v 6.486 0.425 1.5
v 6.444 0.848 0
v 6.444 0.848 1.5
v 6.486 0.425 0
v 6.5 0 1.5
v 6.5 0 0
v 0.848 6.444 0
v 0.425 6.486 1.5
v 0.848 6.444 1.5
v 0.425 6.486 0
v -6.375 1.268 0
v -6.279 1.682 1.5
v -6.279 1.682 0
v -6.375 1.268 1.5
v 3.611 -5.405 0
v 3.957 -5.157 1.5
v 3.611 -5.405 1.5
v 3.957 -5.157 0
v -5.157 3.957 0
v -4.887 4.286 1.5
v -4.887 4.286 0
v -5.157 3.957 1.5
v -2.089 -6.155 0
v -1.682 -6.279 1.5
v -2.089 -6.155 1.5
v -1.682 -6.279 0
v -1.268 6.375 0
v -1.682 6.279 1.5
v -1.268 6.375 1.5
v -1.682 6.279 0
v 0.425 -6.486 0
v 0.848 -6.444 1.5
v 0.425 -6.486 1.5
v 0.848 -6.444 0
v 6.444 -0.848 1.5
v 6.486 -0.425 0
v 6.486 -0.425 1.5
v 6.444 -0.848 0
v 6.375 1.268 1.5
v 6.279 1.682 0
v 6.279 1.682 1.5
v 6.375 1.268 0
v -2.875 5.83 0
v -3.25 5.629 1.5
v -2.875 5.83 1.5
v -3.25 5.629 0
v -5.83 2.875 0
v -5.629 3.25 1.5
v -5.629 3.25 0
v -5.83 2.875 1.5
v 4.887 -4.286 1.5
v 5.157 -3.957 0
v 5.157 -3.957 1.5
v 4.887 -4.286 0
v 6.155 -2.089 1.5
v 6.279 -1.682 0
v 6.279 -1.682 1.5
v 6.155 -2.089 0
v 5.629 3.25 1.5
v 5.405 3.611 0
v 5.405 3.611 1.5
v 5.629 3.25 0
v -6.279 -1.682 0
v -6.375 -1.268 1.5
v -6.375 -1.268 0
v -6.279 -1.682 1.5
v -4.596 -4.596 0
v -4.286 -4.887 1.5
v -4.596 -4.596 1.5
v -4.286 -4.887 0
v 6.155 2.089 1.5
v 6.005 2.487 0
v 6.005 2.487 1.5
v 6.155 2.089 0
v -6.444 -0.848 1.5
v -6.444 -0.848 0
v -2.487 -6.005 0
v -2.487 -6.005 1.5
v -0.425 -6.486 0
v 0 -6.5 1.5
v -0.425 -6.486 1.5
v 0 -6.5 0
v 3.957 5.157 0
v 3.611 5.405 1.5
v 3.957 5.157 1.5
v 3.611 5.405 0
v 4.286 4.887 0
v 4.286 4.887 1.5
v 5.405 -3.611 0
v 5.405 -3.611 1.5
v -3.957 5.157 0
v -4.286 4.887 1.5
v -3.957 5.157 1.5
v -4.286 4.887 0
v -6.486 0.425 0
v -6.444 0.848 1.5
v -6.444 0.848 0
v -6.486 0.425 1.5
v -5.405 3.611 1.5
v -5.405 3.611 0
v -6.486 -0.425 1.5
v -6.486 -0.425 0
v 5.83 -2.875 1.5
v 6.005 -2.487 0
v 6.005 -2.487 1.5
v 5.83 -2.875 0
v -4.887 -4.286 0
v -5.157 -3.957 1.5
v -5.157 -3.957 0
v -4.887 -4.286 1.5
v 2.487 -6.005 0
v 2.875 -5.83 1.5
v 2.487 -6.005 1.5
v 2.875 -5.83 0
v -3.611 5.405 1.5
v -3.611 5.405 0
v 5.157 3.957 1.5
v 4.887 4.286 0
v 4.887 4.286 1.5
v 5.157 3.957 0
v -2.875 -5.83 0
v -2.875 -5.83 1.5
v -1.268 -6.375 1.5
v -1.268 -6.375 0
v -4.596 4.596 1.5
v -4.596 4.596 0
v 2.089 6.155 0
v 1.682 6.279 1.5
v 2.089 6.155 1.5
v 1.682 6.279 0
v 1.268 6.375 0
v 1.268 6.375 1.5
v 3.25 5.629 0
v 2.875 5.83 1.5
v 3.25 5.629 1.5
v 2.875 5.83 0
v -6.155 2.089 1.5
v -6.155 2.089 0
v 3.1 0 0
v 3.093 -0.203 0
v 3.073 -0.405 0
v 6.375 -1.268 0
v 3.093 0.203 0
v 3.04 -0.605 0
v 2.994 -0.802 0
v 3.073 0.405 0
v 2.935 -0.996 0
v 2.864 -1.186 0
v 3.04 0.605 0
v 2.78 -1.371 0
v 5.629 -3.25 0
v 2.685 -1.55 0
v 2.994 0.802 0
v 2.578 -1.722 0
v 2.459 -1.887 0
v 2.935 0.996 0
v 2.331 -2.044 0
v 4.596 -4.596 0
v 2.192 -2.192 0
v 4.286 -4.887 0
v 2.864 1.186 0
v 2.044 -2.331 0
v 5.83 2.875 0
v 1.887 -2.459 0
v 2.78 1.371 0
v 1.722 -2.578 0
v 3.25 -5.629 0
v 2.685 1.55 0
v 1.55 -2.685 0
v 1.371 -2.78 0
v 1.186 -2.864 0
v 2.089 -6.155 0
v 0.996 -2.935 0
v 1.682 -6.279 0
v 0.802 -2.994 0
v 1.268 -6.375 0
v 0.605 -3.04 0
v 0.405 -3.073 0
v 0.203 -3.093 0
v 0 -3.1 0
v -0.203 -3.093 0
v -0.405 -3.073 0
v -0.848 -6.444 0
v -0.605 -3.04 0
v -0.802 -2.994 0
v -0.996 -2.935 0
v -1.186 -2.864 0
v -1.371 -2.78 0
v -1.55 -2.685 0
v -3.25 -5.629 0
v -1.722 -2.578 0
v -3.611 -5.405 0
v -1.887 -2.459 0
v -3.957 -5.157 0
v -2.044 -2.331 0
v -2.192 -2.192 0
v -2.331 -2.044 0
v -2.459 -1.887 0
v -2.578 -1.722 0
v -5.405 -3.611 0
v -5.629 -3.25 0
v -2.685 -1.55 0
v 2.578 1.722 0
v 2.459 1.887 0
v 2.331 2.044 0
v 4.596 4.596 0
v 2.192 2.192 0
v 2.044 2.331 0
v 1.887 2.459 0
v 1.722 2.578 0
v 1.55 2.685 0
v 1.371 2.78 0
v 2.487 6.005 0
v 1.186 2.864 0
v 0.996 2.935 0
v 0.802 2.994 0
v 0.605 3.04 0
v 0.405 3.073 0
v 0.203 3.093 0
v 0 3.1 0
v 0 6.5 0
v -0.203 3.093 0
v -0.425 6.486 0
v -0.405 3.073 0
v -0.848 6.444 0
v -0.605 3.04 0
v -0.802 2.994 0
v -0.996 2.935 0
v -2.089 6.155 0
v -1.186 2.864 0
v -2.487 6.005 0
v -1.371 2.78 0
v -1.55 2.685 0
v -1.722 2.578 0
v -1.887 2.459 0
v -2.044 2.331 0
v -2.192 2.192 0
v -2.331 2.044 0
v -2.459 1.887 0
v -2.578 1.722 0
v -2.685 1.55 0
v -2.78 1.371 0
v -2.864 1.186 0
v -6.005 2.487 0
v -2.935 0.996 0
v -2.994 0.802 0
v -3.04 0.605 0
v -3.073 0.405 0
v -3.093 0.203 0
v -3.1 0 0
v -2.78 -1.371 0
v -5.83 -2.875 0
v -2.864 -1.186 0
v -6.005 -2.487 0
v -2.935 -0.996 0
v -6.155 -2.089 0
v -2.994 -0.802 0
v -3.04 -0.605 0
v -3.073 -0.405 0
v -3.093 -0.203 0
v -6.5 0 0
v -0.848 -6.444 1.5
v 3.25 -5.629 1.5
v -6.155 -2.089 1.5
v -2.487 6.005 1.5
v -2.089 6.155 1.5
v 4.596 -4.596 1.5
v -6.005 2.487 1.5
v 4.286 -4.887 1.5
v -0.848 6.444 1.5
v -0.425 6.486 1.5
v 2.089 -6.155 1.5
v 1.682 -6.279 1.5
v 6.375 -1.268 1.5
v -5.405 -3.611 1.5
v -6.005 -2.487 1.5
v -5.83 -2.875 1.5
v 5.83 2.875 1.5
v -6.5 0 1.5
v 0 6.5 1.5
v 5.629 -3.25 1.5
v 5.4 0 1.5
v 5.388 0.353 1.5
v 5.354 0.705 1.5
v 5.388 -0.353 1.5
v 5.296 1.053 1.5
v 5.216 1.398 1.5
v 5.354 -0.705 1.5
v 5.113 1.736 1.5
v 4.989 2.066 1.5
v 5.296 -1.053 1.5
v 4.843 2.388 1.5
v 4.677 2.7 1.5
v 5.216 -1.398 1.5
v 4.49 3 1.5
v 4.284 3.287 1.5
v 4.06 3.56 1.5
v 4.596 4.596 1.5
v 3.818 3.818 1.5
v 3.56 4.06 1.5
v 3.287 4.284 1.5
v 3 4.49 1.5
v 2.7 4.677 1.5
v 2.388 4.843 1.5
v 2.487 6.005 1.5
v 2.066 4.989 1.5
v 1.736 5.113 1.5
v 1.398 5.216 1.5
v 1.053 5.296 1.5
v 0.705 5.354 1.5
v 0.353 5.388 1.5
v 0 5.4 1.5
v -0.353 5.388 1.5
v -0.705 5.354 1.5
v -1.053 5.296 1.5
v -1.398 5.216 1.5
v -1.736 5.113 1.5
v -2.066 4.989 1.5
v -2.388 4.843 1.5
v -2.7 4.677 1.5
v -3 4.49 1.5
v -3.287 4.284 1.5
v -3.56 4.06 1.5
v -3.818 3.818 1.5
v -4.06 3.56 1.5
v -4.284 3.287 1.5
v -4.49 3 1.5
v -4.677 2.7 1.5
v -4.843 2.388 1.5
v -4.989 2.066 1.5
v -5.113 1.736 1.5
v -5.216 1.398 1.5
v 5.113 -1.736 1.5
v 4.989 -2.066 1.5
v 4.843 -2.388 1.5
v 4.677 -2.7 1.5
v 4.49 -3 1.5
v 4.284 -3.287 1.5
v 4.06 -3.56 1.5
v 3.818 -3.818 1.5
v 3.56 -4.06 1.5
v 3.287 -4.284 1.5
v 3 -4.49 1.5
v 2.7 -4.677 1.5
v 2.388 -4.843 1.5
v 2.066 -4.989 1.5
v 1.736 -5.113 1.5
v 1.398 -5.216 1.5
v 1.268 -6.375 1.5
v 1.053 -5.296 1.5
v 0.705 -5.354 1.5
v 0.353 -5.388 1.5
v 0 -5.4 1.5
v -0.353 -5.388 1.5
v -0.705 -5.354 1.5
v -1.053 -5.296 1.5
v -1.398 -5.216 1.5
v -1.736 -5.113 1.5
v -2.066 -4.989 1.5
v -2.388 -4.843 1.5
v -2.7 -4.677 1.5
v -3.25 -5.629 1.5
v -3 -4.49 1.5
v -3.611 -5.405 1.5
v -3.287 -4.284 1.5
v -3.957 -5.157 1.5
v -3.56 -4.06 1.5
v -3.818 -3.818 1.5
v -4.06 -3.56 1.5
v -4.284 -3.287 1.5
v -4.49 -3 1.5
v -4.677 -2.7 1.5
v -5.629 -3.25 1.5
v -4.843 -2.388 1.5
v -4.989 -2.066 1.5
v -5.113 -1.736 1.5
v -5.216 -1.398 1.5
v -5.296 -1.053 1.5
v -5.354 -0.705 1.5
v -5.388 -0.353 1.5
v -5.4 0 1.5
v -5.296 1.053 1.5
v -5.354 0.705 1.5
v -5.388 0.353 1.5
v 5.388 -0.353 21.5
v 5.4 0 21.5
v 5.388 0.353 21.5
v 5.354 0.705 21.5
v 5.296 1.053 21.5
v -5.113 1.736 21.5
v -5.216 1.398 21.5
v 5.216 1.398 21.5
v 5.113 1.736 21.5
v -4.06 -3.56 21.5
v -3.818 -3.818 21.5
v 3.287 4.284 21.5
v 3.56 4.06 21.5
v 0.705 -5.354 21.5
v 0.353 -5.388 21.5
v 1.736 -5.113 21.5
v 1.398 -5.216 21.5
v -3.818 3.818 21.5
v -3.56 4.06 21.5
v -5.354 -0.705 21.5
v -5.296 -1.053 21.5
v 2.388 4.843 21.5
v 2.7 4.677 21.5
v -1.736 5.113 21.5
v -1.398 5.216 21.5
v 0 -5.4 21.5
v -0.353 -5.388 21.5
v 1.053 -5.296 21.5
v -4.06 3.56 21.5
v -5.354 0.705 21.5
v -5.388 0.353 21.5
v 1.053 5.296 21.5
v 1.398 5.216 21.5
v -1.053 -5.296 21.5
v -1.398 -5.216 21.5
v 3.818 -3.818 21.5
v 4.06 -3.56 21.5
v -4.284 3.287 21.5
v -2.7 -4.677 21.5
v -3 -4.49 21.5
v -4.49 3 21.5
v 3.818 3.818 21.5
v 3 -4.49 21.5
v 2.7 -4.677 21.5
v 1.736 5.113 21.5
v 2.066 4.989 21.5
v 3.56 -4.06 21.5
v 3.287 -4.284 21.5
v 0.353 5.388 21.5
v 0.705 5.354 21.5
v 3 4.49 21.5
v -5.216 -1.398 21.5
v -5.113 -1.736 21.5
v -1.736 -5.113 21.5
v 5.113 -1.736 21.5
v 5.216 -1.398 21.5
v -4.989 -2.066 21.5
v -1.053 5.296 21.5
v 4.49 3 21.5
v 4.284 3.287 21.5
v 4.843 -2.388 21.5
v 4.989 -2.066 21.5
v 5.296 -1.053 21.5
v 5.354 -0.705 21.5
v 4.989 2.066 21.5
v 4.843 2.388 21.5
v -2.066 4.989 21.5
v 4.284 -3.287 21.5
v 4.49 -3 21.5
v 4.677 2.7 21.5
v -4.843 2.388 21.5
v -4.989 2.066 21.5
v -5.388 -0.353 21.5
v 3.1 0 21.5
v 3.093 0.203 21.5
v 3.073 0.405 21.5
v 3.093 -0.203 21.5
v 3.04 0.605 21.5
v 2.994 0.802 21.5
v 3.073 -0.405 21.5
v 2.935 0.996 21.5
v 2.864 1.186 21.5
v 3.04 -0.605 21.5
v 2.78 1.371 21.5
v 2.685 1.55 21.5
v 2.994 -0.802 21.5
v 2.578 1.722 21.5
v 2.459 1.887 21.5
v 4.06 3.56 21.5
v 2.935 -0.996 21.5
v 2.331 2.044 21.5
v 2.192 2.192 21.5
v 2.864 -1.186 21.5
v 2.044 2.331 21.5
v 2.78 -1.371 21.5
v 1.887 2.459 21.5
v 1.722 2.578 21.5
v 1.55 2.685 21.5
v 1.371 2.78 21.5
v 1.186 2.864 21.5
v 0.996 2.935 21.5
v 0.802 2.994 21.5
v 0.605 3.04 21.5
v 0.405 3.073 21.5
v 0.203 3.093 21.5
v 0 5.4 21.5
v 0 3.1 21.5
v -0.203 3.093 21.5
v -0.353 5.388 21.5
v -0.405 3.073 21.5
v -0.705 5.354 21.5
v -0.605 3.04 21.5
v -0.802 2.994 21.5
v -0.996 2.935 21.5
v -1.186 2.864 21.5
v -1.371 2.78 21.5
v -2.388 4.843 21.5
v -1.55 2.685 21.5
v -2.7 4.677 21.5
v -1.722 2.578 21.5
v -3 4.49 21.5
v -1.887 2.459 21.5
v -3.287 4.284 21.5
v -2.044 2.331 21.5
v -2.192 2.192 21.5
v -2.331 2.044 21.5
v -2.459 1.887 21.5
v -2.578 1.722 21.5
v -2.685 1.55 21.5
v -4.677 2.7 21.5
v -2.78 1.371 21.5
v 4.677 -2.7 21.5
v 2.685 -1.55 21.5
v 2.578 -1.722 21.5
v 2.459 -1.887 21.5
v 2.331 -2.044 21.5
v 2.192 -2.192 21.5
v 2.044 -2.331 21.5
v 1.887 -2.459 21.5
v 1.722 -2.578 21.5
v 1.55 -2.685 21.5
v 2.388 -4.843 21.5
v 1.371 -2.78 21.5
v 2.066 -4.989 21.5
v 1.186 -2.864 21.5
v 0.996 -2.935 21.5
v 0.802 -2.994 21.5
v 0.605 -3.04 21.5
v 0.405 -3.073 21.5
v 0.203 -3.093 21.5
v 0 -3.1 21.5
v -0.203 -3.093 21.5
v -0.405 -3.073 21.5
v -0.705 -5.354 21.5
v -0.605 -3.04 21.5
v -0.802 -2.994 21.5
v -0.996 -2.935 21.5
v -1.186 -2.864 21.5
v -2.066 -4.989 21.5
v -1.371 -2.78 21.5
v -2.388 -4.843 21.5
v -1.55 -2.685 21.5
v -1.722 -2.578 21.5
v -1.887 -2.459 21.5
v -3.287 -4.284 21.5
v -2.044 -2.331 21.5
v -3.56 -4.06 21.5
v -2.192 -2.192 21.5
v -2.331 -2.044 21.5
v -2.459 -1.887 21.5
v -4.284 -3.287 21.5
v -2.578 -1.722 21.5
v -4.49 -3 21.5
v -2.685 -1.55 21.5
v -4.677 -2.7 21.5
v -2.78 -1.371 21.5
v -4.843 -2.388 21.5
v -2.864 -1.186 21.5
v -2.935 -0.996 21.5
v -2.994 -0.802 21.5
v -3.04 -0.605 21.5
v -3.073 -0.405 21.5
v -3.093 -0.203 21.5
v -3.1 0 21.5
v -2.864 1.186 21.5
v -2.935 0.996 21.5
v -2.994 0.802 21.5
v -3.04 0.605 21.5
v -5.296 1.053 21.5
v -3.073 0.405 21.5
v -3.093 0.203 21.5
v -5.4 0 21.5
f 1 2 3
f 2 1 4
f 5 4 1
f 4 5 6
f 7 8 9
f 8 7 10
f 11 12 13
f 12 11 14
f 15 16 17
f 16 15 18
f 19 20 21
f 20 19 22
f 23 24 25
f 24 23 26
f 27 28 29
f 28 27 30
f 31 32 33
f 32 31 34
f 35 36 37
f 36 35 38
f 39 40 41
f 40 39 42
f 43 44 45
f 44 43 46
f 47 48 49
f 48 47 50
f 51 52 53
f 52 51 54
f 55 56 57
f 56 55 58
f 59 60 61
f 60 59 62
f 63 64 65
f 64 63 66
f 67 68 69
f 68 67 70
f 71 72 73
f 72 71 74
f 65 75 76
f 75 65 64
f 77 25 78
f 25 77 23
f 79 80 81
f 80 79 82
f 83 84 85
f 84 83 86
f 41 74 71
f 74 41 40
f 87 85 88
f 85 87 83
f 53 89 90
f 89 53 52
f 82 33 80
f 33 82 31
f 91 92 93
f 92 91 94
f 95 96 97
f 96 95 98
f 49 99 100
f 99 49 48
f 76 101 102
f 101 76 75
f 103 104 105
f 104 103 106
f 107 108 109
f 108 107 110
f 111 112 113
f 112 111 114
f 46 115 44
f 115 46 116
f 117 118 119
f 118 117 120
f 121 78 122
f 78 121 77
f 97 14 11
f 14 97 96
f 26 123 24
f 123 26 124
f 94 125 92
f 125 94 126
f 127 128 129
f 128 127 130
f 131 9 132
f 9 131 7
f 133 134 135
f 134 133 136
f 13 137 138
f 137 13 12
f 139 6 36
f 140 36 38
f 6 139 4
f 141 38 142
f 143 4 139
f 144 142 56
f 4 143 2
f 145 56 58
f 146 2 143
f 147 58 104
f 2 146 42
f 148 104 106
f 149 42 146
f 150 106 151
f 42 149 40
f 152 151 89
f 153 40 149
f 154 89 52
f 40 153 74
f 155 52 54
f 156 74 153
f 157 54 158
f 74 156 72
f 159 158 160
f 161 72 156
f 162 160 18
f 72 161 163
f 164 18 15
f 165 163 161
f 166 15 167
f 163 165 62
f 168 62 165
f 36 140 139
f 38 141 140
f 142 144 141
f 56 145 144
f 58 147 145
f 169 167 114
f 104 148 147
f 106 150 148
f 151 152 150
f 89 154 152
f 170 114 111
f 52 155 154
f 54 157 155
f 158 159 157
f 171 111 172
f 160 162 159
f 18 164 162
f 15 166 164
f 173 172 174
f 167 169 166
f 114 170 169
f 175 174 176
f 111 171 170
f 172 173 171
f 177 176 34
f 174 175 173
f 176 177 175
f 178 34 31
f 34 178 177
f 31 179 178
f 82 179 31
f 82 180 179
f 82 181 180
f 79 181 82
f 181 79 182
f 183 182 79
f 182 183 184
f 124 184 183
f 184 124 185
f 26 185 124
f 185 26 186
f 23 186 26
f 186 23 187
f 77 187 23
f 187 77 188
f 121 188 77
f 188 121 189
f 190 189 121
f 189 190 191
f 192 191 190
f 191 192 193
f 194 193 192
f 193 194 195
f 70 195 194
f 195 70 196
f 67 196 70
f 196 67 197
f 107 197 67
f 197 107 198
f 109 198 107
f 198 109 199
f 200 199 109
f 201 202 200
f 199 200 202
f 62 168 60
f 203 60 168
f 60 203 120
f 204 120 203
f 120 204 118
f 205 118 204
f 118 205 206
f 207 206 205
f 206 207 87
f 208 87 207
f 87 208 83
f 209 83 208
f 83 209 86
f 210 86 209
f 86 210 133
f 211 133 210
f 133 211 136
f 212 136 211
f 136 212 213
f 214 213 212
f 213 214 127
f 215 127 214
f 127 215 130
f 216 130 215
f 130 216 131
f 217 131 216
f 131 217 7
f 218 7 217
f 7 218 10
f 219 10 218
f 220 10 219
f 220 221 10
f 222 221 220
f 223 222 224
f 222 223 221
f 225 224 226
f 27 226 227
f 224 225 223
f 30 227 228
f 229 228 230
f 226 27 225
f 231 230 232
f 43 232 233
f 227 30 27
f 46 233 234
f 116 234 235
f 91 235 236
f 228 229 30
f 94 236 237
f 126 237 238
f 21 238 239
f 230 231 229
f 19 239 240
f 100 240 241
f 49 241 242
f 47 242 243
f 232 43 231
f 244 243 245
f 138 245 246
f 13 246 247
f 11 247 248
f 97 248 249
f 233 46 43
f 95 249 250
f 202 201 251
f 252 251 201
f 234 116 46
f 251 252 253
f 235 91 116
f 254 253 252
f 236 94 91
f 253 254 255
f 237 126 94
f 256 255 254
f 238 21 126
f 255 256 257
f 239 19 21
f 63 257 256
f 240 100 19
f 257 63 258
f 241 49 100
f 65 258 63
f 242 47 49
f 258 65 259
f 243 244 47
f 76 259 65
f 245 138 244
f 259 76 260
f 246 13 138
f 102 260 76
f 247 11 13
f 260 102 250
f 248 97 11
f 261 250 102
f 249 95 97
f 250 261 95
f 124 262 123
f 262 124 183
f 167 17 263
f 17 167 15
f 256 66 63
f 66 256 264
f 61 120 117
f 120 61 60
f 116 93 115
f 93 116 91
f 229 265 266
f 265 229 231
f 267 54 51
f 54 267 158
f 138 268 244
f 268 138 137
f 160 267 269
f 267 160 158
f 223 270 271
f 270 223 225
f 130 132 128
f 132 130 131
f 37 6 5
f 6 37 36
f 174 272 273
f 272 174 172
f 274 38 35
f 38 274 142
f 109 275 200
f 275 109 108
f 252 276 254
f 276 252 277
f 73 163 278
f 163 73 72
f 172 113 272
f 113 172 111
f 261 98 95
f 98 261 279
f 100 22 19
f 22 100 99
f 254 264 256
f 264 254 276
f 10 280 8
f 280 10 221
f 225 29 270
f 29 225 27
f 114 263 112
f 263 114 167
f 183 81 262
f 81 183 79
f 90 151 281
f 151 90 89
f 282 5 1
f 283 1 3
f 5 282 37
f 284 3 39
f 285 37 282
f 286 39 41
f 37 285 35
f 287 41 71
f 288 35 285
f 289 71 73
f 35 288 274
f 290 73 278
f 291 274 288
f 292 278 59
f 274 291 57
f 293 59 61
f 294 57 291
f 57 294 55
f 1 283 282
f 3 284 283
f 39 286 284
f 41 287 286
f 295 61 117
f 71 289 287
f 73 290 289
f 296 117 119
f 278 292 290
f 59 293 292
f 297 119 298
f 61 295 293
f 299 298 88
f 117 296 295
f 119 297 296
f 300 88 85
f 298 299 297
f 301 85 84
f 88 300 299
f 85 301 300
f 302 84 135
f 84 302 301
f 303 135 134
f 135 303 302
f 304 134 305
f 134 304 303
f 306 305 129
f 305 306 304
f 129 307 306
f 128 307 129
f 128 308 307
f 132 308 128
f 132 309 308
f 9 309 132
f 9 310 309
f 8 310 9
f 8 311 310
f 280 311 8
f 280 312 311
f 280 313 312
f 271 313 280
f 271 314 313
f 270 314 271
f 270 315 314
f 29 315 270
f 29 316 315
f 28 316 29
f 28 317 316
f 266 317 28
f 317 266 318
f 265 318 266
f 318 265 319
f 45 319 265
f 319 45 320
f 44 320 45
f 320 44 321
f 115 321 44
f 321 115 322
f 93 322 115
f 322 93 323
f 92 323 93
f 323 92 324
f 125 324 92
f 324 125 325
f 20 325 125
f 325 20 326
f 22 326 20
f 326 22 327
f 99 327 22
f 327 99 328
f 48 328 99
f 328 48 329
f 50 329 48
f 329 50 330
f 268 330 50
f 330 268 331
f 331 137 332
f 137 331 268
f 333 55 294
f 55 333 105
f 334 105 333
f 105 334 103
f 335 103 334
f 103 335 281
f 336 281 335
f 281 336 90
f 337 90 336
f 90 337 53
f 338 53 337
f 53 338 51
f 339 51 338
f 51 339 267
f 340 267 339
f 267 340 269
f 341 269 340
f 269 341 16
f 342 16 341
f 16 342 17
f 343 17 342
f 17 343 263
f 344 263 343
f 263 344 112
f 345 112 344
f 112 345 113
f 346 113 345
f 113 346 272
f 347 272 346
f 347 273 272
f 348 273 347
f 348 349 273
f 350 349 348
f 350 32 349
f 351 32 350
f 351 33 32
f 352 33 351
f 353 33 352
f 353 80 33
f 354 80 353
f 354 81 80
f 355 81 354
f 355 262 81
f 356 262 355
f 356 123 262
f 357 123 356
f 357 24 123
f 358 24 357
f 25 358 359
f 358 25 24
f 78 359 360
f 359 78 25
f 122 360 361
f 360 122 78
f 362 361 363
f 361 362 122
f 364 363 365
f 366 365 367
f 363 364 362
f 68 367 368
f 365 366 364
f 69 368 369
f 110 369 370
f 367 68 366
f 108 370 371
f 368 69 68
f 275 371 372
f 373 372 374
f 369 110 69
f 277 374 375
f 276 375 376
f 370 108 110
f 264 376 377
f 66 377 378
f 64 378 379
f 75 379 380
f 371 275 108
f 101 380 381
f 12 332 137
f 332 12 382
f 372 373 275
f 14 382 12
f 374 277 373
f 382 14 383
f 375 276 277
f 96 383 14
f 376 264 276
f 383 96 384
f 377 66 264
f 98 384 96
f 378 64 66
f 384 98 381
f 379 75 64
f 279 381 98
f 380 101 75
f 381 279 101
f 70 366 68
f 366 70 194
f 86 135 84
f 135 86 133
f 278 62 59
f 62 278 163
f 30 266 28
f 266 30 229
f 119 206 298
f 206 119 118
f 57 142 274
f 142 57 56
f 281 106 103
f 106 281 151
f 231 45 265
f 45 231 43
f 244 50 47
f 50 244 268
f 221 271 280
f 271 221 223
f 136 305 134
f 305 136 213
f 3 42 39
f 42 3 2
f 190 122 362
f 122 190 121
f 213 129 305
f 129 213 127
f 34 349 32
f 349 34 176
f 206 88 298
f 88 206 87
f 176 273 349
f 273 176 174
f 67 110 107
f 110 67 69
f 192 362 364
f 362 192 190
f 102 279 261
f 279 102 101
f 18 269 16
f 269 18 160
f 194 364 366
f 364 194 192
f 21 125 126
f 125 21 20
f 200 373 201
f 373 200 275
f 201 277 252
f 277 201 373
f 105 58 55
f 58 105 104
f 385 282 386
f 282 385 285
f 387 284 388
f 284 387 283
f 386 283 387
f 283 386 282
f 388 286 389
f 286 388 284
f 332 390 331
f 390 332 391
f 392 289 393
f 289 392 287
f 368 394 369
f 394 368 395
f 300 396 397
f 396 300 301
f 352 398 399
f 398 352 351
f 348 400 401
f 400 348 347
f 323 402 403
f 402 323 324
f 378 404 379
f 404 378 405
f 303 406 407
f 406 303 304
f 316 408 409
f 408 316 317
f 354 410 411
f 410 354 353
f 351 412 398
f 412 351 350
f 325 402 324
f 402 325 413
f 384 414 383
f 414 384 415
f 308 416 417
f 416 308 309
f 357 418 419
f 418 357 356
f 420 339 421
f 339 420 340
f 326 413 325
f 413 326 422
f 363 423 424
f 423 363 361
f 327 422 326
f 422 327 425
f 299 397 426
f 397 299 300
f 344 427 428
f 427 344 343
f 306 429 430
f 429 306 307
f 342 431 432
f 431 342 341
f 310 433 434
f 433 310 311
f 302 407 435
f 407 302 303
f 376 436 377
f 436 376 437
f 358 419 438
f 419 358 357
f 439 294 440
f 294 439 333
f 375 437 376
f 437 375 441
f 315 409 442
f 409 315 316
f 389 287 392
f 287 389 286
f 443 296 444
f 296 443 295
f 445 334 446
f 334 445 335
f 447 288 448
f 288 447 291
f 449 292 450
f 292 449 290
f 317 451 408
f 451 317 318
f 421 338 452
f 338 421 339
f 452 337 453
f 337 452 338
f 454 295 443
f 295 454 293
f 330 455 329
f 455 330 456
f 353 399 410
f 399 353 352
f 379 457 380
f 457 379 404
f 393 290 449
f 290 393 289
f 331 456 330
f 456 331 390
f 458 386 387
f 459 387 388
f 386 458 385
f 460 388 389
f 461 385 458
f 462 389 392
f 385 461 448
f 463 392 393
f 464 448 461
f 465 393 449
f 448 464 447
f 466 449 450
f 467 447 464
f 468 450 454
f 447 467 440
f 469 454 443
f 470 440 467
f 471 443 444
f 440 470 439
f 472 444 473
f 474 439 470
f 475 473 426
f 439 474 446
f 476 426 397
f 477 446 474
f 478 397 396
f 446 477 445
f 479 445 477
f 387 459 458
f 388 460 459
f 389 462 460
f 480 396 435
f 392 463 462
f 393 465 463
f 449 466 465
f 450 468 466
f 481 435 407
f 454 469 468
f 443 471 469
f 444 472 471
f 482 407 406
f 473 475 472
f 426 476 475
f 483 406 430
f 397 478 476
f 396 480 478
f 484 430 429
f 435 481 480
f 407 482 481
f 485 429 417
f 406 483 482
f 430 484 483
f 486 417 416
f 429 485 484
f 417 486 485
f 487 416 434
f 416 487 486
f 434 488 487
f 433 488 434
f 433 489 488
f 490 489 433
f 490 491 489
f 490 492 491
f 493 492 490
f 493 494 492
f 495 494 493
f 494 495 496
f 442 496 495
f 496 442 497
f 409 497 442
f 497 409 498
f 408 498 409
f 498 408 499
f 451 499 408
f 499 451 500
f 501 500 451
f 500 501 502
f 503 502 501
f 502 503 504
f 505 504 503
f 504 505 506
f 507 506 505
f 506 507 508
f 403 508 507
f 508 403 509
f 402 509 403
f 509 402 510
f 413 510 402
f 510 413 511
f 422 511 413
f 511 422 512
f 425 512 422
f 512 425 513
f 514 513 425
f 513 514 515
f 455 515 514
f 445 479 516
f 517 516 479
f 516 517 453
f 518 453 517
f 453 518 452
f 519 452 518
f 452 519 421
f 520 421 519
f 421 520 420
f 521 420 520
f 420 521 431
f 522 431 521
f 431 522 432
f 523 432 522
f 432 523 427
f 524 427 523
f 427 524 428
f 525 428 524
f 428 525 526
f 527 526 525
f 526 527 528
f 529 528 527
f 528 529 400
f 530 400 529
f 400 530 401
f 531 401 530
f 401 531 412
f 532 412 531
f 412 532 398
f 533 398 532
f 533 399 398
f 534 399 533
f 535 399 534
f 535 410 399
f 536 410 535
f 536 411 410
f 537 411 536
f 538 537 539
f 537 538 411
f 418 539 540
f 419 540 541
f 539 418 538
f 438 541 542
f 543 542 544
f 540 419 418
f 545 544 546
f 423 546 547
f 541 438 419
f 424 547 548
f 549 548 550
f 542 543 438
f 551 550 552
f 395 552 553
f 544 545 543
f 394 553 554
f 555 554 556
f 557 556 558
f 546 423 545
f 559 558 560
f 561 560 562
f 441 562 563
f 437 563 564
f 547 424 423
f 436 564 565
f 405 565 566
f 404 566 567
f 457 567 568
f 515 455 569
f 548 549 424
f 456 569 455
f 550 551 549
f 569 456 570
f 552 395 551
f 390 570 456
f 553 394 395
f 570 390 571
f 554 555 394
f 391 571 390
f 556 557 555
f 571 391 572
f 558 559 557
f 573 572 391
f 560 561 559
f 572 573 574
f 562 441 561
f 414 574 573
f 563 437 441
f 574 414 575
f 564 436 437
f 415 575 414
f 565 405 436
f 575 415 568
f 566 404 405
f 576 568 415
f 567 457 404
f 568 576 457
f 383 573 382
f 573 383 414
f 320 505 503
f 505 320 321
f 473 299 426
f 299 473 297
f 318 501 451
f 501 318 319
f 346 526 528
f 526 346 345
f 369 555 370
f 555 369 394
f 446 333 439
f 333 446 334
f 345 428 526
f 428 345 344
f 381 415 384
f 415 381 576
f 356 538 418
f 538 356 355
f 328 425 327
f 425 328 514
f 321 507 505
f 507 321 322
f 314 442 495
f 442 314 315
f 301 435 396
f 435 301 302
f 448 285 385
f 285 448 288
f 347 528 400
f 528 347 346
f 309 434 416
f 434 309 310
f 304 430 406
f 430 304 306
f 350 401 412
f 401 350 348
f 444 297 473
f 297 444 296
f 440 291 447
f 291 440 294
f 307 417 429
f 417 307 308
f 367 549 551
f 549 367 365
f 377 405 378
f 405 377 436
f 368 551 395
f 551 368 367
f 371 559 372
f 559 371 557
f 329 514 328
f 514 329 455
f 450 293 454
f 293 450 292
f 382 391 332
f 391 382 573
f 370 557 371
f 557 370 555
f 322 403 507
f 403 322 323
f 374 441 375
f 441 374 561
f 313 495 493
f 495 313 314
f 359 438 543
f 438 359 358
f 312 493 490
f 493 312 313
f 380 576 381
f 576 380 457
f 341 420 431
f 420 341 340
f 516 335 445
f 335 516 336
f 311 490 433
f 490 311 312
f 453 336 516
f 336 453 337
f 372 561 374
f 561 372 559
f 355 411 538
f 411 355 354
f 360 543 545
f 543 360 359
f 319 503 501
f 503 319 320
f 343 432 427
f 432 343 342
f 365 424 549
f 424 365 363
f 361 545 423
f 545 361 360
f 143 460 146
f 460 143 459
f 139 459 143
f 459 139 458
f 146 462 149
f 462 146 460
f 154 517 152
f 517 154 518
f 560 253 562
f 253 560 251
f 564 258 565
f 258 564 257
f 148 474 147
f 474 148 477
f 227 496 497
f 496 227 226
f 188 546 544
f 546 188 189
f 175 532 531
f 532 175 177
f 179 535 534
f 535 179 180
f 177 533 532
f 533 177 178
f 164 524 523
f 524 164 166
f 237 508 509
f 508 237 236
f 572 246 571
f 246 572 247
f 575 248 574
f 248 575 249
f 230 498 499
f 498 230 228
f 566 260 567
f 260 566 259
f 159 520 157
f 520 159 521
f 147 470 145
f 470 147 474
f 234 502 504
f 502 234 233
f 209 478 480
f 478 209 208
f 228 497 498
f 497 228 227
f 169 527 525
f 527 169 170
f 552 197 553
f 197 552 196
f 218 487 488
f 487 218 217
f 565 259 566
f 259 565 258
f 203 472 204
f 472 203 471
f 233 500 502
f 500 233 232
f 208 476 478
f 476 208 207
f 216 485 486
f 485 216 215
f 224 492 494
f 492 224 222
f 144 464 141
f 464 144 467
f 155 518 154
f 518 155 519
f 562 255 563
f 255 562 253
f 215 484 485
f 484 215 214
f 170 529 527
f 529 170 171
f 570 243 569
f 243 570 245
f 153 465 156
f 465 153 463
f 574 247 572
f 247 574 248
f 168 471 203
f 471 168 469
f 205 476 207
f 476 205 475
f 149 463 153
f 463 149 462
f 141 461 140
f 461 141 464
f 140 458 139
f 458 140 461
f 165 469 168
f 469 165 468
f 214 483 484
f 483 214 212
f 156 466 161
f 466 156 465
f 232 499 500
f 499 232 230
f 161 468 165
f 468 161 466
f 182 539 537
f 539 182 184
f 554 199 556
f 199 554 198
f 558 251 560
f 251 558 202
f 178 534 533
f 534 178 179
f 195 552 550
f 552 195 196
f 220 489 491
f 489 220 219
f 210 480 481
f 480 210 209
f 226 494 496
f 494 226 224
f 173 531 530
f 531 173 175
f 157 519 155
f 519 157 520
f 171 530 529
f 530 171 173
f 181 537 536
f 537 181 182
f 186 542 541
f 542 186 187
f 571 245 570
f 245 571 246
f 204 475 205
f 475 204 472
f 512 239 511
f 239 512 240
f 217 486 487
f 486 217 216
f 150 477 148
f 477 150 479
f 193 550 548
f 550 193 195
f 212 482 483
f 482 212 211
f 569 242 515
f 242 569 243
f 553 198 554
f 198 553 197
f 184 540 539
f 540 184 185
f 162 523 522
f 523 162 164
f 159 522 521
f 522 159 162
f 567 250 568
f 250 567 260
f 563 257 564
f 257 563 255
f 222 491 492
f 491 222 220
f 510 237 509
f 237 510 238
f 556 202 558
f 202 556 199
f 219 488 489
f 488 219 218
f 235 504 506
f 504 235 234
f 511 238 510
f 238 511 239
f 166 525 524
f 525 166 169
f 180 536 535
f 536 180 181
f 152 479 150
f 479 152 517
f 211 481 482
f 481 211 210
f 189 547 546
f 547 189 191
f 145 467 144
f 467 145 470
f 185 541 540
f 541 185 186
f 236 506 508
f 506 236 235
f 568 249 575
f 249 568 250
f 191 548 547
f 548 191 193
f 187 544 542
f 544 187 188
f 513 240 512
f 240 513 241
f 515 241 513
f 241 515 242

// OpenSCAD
// PCR tube adapter sleeve - prints upside down
// Units: mm

$fn = 96;

// --- Dimensions ---
collar_d      = 13;    // collar outer diameter (on bed)
collar_h      = 1.5;   // collar thickness (z = 0 to 1.5)
sleeve_od     = 10.8;  // sleeve outer diameter
sleeve_top_z  = 21.5;  // top of sleeve body (absolute z)
bore_d        = 6.2;   // through-bore diameter
eps           = 0.5;   // cutter overshoot past faces

difference() {
    union() {
        // Collar
        cylinder(d = collar_d, h = collar_h);
        // Sleeve body (from collar top up to z = 21.5)
        translate([0, 0, collar_h])
            cylinder(d = sleeve_od, h = sleeve_top_z - collar_h);
    }
    // Through-bore
    translate([0, 0, -eps])
        cylinder(d = bore_d, h = sleeve_top_z + 2 * eps);
}
